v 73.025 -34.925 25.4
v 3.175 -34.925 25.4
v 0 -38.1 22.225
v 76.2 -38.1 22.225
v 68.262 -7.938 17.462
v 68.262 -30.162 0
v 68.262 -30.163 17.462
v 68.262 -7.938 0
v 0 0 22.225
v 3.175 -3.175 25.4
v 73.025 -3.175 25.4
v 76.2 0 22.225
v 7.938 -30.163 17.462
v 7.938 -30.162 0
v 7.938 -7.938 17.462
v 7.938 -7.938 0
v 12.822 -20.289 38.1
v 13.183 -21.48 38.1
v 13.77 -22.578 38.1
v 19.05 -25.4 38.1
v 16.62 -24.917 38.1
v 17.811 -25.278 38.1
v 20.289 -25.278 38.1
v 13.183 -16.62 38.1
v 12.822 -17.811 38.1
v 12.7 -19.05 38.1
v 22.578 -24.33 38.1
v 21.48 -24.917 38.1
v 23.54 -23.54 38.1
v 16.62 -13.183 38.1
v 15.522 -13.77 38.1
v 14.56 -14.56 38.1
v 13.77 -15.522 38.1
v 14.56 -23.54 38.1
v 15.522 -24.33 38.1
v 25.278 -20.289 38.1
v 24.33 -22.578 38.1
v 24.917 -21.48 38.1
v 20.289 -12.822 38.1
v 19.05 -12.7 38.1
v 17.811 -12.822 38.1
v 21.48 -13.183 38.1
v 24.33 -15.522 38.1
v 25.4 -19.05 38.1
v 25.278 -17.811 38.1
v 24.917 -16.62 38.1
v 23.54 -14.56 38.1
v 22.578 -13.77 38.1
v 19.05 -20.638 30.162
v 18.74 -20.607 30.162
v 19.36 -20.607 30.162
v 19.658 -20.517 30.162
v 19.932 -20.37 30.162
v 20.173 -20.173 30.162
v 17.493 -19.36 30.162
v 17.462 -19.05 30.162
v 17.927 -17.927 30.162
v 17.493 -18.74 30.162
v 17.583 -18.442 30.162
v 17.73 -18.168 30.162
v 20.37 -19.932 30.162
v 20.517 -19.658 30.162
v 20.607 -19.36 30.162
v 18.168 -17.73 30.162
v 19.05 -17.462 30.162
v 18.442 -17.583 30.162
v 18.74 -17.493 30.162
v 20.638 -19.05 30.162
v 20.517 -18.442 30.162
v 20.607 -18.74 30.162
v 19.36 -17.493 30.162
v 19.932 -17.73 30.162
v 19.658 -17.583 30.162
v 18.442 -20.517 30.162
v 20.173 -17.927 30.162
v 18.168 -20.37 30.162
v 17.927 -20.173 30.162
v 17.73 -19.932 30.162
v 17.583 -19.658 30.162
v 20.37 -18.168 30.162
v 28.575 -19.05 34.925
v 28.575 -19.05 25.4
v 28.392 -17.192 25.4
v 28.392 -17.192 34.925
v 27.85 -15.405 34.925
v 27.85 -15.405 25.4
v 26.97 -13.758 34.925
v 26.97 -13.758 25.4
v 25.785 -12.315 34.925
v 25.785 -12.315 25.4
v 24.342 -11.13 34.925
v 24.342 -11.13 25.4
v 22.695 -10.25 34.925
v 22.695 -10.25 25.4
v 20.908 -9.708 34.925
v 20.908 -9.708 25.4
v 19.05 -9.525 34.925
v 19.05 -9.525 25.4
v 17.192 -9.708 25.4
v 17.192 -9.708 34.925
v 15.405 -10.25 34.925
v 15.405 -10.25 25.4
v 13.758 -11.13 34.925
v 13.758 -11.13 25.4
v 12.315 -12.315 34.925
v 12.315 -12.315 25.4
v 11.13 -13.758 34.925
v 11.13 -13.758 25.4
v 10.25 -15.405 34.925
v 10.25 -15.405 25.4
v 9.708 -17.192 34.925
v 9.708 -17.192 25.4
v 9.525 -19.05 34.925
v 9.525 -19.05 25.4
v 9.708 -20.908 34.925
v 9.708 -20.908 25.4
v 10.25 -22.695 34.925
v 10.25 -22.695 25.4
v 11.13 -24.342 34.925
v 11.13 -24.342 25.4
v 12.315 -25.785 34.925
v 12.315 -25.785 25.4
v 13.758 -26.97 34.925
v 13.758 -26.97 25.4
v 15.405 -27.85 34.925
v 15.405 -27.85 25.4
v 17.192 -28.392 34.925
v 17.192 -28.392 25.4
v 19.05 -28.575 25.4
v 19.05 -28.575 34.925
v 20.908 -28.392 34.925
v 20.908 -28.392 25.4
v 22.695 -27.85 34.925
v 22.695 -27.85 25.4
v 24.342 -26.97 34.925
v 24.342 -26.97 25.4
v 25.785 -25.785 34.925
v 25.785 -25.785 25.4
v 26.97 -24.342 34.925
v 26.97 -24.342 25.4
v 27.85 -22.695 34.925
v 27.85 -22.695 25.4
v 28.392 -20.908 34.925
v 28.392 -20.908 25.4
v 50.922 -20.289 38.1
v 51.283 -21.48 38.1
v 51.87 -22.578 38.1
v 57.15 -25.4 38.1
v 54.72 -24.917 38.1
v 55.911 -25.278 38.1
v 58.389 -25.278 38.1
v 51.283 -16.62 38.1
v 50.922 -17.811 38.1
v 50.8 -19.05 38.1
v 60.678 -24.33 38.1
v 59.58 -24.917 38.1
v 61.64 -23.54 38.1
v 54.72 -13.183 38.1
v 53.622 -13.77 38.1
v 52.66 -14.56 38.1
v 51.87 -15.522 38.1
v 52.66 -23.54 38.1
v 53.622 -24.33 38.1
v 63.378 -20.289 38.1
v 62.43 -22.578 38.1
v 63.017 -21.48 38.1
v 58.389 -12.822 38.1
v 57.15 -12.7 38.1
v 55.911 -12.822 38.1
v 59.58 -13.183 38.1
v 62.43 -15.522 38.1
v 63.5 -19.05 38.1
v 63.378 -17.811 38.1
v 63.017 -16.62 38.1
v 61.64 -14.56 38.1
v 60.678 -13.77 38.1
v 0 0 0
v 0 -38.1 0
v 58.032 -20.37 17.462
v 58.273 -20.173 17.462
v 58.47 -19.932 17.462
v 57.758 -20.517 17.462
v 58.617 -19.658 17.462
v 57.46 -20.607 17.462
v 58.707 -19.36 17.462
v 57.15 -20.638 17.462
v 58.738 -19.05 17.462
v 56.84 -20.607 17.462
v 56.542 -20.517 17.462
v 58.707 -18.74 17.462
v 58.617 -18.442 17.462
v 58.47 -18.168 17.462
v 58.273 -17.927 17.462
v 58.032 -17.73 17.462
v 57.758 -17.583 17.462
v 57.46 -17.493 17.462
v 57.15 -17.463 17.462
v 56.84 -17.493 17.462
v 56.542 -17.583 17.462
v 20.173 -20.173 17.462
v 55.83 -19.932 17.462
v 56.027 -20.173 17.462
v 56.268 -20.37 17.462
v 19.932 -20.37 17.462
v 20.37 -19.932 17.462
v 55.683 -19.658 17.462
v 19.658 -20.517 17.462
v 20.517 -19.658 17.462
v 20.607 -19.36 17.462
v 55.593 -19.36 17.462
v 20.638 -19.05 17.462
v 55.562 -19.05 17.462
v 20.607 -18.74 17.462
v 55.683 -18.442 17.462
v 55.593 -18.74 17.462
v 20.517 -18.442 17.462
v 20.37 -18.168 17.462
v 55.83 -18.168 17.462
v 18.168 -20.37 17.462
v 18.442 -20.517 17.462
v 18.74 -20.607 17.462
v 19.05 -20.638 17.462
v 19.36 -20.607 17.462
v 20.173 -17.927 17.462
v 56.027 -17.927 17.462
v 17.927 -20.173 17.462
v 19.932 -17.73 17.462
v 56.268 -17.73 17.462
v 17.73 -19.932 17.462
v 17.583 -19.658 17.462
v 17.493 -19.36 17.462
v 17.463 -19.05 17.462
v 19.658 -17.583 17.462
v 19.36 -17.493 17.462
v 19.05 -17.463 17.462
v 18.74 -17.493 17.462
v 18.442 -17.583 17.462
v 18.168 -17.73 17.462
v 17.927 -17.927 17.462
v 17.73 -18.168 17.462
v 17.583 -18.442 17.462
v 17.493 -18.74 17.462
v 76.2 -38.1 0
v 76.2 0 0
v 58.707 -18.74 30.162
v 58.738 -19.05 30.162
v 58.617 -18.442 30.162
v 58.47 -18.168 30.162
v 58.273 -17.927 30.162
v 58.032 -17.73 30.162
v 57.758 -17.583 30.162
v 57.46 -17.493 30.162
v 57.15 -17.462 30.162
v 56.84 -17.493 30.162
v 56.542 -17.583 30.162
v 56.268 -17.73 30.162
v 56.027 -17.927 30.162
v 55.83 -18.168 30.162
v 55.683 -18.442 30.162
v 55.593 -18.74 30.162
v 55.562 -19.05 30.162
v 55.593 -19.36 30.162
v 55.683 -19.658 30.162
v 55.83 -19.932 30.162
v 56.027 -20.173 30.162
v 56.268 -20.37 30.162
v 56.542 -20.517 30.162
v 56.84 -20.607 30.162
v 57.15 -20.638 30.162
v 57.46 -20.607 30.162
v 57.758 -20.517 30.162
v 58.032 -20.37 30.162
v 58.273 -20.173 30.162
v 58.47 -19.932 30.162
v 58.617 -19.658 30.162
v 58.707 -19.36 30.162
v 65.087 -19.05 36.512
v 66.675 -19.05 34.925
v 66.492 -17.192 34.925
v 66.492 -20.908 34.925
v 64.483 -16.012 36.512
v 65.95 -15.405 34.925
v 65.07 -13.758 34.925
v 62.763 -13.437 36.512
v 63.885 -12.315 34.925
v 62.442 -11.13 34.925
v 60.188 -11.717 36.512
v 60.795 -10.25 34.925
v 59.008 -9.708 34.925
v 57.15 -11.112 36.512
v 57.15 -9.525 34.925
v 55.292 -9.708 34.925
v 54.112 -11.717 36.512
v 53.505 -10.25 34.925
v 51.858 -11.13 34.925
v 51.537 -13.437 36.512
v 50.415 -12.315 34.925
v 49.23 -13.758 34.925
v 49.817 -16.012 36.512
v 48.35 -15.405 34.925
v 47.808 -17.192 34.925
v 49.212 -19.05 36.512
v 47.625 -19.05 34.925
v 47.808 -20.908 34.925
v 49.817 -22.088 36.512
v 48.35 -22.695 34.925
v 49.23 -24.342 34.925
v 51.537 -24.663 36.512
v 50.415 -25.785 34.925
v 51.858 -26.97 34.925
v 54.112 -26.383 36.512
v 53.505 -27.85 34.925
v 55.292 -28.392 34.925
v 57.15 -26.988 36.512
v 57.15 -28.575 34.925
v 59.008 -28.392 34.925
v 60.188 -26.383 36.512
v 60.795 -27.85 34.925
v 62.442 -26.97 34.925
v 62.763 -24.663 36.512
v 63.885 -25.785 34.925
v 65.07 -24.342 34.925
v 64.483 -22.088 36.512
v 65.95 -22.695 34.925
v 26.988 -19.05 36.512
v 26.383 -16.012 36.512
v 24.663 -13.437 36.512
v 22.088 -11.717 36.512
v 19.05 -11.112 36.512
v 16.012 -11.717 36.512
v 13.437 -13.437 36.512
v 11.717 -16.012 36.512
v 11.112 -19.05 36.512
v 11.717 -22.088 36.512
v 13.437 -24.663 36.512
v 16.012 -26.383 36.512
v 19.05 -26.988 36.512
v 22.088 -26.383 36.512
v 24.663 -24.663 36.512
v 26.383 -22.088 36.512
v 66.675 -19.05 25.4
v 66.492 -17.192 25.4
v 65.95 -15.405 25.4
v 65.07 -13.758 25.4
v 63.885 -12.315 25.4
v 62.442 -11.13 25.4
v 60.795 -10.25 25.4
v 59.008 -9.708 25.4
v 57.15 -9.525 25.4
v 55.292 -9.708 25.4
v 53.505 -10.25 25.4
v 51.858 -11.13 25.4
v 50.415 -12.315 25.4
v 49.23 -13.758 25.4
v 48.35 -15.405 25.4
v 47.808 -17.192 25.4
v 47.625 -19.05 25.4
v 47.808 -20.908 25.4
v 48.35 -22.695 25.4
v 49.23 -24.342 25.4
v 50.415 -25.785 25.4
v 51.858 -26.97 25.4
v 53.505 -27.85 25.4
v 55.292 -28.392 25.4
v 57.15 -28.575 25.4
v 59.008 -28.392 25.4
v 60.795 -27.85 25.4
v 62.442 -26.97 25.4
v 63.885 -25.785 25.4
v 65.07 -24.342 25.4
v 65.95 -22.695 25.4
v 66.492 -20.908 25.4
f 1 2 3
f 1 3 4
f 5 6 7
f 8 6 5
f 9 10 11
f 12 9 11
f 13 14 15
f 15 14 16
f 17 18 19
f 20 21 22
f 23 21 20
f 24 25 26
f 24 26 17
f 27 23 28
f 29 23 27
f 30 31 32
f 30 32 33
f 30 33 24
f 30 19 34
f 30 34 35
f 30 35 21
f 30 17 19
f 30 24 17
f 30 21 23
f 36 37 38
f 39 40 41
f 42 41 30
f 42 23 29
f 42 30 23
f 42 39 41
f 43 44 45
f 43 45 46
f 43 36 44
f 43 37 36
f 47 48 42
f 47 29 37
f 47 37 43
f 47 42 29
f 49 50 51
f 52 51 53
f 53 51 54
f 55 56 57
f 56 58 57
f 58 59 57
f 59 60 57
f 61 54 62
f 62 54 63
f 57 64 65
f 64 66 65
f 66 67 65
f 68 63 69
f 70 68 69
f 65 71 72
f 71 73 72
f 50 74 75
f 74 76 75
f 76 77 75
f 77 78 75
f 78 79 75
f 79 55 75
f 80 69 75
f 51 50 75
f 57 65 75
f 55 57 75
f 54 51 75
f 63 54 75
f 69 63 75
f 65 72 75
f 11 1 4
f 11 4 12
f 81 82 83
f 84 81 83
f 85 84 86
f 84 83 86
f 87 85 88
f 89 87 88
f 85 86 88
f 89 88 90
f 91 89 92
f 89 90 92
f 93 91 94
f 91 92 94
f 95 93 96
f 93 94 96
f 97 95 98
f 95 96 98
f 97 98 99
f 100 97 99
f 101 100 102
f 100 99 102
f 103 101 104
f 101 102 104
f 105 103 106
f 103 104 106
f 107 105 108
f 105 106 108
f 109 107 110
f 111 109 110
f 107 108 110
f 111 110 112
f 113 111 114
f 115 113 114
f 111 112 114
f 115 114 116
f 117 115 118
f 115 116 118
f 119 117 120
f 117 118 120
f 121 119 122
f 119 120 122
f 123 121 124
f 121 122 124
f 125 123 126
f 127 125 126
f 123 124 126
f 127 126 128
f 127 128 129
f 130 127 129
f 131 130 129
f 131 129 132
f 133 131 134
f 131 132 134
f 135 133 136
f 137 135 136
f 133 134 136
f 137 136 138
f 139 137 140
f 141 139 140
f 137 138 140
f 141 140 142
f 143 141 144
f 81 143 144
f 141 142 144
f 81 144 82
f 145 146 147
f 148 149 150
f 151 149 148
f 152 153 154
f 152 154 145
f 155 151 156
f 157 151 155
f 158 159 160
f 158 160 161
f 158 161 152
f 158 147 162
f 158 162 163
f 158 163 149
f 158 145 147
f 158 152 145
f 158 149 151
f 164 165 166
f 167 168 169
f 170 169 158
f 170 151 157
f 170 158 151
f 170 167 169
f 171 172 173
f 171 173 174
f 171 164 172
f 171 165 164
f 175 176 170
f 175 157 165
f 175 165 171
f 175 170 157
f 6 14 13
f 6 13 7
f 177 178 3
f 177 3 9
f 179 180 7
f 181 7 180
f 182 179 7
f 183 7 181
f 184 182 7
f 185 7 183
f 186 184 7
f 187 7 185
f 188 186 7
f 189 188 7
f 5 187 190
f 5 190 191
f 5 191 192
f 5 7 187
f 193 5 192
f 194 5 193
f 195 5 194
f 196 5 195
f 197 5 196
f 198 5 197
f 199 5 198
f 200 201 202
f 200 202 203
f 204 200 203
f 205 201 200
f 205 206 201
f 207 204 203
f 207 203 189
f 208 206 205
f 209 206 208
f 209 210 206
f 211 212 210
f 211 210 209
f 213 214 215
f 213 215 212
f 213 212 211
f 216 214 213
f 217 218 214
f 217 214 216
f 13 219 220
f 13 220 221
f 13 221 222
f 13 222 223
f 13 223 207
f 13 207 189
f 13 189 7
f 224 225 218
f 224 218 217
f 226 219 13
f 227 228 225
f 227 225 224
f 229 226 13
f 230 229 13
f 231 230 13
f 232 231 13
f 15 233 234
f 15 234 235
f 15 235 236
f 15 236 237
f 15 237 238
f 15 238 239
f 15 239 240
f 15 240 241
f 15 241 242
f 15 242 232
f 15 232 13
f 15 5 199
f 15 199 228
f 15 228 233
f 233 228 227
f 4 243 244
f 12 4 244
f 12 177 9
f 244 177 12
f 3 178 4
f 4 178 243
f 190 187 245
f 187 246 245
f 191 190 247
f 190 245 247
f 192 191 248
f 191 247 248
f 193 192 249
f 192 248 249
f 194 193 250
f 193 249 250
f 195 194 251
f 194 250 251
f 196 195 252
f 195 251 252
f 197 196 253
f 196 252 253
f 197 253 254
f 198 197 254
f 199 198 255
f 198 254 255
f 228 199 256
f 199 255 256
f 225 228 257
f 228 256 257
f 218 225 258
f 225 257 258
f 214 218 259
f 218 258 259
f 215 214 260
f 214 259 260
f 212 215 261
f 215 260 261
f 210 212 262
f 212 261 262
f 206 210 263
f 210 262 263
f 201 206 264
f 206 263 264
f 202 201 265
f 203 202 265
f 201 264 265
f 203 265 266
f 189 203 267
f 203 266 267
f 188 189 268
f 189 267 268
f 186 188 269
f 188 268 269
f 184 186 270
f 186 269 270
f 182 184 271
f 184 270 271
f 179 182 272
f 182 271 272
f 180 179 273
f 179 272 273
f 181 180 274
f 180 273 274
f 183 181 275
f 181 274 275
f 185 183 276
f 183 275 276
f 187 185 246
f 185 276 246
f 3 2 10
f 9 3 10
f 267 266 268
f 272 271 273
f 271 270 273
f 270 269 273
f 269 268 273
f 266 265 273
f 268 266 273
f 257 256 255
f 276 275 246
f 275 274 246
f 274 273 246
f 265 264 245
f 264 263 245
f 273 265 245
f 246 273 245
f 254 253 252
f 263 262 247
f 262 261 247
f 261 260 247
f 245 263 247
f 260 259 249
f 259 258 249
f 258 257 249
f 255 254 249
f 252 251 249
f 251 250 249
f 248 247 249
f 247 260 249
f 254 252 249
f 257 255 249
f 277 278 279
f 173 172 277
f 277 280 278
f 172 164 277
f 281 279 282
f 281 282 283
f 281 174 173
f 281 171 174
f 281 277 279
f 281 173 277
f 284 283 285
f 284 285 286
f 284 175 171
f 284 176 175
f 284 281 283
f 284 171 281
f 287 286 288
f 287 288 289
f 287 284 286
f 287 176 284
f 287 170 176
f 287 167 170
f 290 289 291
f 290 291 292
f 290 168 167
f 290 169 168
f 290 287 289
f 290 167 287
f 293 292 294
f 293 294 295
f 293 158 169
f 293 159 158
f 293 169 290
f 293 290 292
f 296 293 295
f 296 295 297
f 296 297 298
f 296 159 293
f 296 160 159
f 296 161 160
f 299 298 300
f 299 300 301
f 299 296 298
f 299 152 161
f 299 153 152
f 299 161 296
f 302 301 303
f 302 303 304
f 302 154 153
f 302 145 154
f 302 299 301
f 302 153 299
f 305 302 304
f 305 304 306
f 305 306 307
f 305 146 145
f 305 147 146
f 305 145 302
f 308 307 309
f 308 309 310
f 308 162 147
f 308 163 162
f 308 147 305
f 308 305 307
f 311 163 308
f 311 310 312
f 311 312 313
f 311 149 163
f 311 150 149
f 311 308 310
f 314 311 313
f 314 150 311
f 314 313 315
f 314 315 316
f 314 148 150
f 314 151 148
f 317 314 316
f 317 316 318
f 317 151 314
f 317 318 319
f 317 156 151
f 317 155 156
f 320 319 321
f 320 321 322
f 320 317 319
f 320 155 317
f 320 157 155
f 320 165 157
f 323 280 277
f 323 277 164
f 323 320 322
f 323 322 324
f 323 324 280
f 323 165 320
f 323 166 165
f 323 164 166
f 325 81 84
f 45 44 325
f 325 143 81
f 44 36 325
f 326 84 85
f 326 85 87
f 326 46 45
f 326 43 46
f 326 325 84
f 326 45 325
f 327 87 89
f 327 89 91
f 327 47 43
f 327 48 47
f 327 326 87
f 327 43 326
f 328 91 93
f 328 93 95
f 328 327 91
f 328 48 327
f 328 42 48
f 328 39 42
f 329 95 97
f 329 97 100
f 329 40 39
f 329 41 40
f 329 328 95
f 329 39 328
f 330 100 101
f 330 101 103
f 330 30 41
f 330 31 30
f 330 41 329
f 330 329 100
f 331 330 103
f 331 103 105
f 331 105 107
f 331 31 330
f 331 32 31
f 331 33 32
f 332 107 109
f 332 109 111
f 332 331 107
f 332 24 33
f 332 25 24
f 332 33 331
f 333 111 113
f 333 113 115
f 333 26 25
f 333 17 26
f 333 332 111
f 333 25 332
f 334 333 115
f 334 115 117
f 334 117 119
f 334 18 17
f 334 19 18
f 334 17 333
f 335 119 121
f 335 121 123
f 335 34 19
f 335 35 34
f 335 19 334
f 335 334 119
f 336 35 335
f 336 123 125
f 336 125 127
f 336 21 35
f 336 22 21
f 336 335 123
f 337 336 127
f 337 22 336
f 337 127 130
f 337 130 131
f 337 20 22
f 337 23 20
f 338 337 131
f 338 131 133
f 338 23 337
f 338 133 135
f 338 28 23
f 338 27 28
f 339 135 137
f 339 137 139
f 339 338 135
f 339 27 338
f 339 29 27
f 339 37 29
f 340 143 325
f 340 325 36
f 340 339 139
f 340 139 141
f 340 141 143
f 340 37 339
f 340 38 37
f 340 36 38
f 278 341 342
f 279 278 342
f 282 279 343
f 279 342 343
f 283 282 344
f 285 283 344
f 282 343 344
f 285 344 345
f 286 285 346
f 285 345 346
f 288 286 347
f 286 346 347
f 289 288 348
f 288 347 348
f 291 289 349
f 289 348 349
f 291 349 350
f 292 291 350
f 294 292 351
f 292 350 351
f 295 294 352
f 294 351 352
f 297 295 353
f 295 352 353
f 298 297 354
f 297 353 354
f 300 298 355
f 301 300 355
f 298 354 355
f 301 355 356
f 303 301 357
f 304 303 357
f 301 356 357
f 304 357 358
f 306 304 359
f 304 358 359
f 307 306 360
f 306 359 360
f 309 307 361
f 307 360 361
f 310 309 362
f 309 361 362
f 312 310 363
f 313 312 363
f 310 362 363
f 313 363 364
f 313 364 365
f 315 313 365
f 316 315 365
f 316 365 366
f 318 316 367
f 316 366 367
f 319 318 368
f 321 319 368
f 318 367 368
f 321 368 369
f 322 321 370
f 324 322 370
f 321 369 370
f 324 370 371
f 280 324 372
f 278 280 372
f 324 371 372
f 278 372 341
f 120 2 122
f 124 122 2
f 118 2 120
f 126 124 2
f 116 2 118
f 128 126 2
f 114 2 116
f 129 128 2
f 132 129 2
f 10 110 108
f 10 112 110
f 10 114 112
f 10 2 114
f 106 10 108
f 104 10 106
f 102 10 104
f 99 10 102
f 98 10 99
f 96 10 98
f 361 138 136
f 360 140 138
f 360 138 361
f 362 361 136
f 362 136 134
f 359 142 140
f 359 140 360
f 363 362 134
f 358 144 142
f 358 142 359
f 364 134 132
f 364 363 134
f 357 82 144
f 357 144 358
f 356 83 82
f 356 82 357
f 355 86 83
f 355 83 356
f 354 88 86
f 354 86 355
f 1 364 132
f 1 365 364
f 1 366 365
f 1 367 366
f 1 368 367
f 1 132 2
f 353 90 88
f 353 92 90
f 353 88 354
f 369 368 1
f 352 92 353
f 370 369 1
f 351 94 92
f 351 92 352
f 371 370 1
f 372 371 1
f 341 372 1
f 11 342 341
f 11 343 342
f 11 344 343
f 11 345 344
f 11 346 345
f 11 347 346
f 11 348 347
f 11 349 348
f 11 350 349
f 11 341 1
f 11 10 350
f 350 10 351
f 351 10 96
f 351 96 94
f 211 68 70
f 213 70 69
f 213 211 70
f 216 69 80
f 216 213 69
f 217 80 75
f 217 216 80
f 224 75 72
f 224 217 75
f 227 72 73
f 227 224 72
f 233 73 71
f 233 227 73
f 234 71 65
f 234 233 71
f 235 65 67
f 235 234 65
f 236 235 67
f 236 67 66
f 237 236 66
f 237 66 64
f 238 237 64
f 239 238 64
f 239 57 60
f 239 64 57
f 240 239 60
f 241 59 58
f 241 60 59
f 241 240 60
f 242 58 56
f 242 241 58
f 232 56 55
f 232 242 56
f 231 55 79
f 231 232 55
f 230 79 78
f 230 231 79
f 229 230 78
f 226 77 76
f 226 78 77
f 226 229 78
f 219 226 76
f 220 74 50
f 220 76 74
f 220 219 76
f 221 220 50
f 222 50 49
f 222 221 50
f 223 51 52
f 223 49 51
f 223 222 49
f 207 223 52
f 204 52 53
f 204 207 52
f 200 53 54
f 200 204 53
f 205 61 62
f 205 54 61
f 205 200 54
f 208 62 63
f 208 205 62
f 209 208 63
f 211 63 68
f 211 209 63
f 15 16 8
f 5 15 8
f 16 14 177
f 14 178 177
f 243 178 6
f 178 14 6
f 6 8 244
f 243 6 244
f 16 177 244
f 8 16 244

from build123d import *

# Parameters (mm, degrees)
F0_W     = 76.2
F0_H     = 38.1
F1_DEPTH = 25.4
F2_SIZE  = 3.175
F3_R     = 9.525
F4_DEPTH = 12.7
F5_SIZE2 = 3.175
F5_SIZE  = 3.175
F6_T     = 7.9375


# Not quite as in the source:
# - a shell that OpenCascade refuses in one call is made with other operations: the cavity is built on its own and cut out


with BuildPart() as f1:
    # F0 (on Top) → F1 (new body)
    with BuildSketch(Plane.XY):
        with Locations((38.1, -19.05)):
            Rectangle(F0_W, F0_H)
    extrude(amount=F1_DEPTH)

    # F2
    f2_edges = [f1.edges().sort_by_distance(p)[0] for p in [
        (38.1, -38.1, 25.4),
        (76.2, -19.05, 25.4),
        (38.1, 0, 25.4),
        (0, -19.05, 25.4),
    ]]
    chamfer(f2_edges, length=F2_SIZE)

    # F3 (on face) → F4 (join)
    with BuildSketch(Plane.XY.offset(25.4)):
        with Locations((19.05, -19.05)):
            Circle(F3_R)
        with Locations((57.15, -19.05)):
            Circle(F3_R)
    extrude(amount=F4_DEPTH)

    # F5
    f5_edges = [f1.edges().sort_by_distance(p)[0] for p in [
        (9.525, -19.05, 38.1),
        (47.625, -19.05, 38.1),
    ]]
    chamfer(f5_edges, length=F5_SIZE, length2=F5_SIZE2)

    # F6: shell of thickness 7.9375, made by hand


with BuildPart() as f6_core1:
    # F6_t2: copy of F1
    add(f1.part)

    # the walls: a layer under each face that stays
    f6_faces = [f6_core1.faces().sort_by_distance(p)[0] for p in [
        (9.525, -19.05, 30.1625),
        (11.1125, -19.05, 36.5125),
        (38.1, -19.05, 25.4),
        (19.05, -19.05, 38.1),
        (38.1, -36.5125, 23.8125),
        (1.5875, -19.05, 23.8125),
        (74.6125, -19.05, 23.8125),
        (38.1, -1.5875, 23.8125),
        (47.625, -19.05, 30.1625),
        (38.1, -38.1, 11.1125),
        (0, -19.05, 11.1125),
        (76.2, -19.05, 11.1125),
        (38.1, 0, 11.1125),
        (49.2125, -19.05, 36.5125),
        (57.15, -19.05, 38.1),
    ]]
    thicken(f6_faces, amount=-F6_T, mode=Mode.SUBTRACT)

    # F6_s3 → F6_t4 (revolve, cut)
    with BuildSketch(Plane.XZ.offset(19.05)):
        Polygon((28.654375, 25.479375), (20.6375, 25.4), (20.6375, 17.4625), (28.575, 17.4625), align=None)
    revolve(axis=Axis((19.05, -19.05, 25.4), (0, 0, 1)), mode=Mode.SUBTRACT)

    # F6_s5 → F6_t6 (revolve, cut)
    with BuildSketch(Plane.XZ.offset(19.05)):
        Polygon((66.754375, 25.479375), (66.675, 17.4625), (58.7375, 17.4625), (58.7375, 25.4), align=None)
    revolve(axis=Axis((57.15, -19.05, 25.4), (0, 0, 1)), mode=Mode.SUBTRACT)


with BuildPart() as f1_1:
    add(f1.part)

    # what is left inside the walls is the cavity
    f6_cavity = [f6_core1.part.solids().sort_by_distance(p)[0] for p in [
        (38.1, -22.754167, 0.079375),
    ]]
    add(f6_cavity, mode=Mode.SUBTRACT)


solid = f1_1.part
